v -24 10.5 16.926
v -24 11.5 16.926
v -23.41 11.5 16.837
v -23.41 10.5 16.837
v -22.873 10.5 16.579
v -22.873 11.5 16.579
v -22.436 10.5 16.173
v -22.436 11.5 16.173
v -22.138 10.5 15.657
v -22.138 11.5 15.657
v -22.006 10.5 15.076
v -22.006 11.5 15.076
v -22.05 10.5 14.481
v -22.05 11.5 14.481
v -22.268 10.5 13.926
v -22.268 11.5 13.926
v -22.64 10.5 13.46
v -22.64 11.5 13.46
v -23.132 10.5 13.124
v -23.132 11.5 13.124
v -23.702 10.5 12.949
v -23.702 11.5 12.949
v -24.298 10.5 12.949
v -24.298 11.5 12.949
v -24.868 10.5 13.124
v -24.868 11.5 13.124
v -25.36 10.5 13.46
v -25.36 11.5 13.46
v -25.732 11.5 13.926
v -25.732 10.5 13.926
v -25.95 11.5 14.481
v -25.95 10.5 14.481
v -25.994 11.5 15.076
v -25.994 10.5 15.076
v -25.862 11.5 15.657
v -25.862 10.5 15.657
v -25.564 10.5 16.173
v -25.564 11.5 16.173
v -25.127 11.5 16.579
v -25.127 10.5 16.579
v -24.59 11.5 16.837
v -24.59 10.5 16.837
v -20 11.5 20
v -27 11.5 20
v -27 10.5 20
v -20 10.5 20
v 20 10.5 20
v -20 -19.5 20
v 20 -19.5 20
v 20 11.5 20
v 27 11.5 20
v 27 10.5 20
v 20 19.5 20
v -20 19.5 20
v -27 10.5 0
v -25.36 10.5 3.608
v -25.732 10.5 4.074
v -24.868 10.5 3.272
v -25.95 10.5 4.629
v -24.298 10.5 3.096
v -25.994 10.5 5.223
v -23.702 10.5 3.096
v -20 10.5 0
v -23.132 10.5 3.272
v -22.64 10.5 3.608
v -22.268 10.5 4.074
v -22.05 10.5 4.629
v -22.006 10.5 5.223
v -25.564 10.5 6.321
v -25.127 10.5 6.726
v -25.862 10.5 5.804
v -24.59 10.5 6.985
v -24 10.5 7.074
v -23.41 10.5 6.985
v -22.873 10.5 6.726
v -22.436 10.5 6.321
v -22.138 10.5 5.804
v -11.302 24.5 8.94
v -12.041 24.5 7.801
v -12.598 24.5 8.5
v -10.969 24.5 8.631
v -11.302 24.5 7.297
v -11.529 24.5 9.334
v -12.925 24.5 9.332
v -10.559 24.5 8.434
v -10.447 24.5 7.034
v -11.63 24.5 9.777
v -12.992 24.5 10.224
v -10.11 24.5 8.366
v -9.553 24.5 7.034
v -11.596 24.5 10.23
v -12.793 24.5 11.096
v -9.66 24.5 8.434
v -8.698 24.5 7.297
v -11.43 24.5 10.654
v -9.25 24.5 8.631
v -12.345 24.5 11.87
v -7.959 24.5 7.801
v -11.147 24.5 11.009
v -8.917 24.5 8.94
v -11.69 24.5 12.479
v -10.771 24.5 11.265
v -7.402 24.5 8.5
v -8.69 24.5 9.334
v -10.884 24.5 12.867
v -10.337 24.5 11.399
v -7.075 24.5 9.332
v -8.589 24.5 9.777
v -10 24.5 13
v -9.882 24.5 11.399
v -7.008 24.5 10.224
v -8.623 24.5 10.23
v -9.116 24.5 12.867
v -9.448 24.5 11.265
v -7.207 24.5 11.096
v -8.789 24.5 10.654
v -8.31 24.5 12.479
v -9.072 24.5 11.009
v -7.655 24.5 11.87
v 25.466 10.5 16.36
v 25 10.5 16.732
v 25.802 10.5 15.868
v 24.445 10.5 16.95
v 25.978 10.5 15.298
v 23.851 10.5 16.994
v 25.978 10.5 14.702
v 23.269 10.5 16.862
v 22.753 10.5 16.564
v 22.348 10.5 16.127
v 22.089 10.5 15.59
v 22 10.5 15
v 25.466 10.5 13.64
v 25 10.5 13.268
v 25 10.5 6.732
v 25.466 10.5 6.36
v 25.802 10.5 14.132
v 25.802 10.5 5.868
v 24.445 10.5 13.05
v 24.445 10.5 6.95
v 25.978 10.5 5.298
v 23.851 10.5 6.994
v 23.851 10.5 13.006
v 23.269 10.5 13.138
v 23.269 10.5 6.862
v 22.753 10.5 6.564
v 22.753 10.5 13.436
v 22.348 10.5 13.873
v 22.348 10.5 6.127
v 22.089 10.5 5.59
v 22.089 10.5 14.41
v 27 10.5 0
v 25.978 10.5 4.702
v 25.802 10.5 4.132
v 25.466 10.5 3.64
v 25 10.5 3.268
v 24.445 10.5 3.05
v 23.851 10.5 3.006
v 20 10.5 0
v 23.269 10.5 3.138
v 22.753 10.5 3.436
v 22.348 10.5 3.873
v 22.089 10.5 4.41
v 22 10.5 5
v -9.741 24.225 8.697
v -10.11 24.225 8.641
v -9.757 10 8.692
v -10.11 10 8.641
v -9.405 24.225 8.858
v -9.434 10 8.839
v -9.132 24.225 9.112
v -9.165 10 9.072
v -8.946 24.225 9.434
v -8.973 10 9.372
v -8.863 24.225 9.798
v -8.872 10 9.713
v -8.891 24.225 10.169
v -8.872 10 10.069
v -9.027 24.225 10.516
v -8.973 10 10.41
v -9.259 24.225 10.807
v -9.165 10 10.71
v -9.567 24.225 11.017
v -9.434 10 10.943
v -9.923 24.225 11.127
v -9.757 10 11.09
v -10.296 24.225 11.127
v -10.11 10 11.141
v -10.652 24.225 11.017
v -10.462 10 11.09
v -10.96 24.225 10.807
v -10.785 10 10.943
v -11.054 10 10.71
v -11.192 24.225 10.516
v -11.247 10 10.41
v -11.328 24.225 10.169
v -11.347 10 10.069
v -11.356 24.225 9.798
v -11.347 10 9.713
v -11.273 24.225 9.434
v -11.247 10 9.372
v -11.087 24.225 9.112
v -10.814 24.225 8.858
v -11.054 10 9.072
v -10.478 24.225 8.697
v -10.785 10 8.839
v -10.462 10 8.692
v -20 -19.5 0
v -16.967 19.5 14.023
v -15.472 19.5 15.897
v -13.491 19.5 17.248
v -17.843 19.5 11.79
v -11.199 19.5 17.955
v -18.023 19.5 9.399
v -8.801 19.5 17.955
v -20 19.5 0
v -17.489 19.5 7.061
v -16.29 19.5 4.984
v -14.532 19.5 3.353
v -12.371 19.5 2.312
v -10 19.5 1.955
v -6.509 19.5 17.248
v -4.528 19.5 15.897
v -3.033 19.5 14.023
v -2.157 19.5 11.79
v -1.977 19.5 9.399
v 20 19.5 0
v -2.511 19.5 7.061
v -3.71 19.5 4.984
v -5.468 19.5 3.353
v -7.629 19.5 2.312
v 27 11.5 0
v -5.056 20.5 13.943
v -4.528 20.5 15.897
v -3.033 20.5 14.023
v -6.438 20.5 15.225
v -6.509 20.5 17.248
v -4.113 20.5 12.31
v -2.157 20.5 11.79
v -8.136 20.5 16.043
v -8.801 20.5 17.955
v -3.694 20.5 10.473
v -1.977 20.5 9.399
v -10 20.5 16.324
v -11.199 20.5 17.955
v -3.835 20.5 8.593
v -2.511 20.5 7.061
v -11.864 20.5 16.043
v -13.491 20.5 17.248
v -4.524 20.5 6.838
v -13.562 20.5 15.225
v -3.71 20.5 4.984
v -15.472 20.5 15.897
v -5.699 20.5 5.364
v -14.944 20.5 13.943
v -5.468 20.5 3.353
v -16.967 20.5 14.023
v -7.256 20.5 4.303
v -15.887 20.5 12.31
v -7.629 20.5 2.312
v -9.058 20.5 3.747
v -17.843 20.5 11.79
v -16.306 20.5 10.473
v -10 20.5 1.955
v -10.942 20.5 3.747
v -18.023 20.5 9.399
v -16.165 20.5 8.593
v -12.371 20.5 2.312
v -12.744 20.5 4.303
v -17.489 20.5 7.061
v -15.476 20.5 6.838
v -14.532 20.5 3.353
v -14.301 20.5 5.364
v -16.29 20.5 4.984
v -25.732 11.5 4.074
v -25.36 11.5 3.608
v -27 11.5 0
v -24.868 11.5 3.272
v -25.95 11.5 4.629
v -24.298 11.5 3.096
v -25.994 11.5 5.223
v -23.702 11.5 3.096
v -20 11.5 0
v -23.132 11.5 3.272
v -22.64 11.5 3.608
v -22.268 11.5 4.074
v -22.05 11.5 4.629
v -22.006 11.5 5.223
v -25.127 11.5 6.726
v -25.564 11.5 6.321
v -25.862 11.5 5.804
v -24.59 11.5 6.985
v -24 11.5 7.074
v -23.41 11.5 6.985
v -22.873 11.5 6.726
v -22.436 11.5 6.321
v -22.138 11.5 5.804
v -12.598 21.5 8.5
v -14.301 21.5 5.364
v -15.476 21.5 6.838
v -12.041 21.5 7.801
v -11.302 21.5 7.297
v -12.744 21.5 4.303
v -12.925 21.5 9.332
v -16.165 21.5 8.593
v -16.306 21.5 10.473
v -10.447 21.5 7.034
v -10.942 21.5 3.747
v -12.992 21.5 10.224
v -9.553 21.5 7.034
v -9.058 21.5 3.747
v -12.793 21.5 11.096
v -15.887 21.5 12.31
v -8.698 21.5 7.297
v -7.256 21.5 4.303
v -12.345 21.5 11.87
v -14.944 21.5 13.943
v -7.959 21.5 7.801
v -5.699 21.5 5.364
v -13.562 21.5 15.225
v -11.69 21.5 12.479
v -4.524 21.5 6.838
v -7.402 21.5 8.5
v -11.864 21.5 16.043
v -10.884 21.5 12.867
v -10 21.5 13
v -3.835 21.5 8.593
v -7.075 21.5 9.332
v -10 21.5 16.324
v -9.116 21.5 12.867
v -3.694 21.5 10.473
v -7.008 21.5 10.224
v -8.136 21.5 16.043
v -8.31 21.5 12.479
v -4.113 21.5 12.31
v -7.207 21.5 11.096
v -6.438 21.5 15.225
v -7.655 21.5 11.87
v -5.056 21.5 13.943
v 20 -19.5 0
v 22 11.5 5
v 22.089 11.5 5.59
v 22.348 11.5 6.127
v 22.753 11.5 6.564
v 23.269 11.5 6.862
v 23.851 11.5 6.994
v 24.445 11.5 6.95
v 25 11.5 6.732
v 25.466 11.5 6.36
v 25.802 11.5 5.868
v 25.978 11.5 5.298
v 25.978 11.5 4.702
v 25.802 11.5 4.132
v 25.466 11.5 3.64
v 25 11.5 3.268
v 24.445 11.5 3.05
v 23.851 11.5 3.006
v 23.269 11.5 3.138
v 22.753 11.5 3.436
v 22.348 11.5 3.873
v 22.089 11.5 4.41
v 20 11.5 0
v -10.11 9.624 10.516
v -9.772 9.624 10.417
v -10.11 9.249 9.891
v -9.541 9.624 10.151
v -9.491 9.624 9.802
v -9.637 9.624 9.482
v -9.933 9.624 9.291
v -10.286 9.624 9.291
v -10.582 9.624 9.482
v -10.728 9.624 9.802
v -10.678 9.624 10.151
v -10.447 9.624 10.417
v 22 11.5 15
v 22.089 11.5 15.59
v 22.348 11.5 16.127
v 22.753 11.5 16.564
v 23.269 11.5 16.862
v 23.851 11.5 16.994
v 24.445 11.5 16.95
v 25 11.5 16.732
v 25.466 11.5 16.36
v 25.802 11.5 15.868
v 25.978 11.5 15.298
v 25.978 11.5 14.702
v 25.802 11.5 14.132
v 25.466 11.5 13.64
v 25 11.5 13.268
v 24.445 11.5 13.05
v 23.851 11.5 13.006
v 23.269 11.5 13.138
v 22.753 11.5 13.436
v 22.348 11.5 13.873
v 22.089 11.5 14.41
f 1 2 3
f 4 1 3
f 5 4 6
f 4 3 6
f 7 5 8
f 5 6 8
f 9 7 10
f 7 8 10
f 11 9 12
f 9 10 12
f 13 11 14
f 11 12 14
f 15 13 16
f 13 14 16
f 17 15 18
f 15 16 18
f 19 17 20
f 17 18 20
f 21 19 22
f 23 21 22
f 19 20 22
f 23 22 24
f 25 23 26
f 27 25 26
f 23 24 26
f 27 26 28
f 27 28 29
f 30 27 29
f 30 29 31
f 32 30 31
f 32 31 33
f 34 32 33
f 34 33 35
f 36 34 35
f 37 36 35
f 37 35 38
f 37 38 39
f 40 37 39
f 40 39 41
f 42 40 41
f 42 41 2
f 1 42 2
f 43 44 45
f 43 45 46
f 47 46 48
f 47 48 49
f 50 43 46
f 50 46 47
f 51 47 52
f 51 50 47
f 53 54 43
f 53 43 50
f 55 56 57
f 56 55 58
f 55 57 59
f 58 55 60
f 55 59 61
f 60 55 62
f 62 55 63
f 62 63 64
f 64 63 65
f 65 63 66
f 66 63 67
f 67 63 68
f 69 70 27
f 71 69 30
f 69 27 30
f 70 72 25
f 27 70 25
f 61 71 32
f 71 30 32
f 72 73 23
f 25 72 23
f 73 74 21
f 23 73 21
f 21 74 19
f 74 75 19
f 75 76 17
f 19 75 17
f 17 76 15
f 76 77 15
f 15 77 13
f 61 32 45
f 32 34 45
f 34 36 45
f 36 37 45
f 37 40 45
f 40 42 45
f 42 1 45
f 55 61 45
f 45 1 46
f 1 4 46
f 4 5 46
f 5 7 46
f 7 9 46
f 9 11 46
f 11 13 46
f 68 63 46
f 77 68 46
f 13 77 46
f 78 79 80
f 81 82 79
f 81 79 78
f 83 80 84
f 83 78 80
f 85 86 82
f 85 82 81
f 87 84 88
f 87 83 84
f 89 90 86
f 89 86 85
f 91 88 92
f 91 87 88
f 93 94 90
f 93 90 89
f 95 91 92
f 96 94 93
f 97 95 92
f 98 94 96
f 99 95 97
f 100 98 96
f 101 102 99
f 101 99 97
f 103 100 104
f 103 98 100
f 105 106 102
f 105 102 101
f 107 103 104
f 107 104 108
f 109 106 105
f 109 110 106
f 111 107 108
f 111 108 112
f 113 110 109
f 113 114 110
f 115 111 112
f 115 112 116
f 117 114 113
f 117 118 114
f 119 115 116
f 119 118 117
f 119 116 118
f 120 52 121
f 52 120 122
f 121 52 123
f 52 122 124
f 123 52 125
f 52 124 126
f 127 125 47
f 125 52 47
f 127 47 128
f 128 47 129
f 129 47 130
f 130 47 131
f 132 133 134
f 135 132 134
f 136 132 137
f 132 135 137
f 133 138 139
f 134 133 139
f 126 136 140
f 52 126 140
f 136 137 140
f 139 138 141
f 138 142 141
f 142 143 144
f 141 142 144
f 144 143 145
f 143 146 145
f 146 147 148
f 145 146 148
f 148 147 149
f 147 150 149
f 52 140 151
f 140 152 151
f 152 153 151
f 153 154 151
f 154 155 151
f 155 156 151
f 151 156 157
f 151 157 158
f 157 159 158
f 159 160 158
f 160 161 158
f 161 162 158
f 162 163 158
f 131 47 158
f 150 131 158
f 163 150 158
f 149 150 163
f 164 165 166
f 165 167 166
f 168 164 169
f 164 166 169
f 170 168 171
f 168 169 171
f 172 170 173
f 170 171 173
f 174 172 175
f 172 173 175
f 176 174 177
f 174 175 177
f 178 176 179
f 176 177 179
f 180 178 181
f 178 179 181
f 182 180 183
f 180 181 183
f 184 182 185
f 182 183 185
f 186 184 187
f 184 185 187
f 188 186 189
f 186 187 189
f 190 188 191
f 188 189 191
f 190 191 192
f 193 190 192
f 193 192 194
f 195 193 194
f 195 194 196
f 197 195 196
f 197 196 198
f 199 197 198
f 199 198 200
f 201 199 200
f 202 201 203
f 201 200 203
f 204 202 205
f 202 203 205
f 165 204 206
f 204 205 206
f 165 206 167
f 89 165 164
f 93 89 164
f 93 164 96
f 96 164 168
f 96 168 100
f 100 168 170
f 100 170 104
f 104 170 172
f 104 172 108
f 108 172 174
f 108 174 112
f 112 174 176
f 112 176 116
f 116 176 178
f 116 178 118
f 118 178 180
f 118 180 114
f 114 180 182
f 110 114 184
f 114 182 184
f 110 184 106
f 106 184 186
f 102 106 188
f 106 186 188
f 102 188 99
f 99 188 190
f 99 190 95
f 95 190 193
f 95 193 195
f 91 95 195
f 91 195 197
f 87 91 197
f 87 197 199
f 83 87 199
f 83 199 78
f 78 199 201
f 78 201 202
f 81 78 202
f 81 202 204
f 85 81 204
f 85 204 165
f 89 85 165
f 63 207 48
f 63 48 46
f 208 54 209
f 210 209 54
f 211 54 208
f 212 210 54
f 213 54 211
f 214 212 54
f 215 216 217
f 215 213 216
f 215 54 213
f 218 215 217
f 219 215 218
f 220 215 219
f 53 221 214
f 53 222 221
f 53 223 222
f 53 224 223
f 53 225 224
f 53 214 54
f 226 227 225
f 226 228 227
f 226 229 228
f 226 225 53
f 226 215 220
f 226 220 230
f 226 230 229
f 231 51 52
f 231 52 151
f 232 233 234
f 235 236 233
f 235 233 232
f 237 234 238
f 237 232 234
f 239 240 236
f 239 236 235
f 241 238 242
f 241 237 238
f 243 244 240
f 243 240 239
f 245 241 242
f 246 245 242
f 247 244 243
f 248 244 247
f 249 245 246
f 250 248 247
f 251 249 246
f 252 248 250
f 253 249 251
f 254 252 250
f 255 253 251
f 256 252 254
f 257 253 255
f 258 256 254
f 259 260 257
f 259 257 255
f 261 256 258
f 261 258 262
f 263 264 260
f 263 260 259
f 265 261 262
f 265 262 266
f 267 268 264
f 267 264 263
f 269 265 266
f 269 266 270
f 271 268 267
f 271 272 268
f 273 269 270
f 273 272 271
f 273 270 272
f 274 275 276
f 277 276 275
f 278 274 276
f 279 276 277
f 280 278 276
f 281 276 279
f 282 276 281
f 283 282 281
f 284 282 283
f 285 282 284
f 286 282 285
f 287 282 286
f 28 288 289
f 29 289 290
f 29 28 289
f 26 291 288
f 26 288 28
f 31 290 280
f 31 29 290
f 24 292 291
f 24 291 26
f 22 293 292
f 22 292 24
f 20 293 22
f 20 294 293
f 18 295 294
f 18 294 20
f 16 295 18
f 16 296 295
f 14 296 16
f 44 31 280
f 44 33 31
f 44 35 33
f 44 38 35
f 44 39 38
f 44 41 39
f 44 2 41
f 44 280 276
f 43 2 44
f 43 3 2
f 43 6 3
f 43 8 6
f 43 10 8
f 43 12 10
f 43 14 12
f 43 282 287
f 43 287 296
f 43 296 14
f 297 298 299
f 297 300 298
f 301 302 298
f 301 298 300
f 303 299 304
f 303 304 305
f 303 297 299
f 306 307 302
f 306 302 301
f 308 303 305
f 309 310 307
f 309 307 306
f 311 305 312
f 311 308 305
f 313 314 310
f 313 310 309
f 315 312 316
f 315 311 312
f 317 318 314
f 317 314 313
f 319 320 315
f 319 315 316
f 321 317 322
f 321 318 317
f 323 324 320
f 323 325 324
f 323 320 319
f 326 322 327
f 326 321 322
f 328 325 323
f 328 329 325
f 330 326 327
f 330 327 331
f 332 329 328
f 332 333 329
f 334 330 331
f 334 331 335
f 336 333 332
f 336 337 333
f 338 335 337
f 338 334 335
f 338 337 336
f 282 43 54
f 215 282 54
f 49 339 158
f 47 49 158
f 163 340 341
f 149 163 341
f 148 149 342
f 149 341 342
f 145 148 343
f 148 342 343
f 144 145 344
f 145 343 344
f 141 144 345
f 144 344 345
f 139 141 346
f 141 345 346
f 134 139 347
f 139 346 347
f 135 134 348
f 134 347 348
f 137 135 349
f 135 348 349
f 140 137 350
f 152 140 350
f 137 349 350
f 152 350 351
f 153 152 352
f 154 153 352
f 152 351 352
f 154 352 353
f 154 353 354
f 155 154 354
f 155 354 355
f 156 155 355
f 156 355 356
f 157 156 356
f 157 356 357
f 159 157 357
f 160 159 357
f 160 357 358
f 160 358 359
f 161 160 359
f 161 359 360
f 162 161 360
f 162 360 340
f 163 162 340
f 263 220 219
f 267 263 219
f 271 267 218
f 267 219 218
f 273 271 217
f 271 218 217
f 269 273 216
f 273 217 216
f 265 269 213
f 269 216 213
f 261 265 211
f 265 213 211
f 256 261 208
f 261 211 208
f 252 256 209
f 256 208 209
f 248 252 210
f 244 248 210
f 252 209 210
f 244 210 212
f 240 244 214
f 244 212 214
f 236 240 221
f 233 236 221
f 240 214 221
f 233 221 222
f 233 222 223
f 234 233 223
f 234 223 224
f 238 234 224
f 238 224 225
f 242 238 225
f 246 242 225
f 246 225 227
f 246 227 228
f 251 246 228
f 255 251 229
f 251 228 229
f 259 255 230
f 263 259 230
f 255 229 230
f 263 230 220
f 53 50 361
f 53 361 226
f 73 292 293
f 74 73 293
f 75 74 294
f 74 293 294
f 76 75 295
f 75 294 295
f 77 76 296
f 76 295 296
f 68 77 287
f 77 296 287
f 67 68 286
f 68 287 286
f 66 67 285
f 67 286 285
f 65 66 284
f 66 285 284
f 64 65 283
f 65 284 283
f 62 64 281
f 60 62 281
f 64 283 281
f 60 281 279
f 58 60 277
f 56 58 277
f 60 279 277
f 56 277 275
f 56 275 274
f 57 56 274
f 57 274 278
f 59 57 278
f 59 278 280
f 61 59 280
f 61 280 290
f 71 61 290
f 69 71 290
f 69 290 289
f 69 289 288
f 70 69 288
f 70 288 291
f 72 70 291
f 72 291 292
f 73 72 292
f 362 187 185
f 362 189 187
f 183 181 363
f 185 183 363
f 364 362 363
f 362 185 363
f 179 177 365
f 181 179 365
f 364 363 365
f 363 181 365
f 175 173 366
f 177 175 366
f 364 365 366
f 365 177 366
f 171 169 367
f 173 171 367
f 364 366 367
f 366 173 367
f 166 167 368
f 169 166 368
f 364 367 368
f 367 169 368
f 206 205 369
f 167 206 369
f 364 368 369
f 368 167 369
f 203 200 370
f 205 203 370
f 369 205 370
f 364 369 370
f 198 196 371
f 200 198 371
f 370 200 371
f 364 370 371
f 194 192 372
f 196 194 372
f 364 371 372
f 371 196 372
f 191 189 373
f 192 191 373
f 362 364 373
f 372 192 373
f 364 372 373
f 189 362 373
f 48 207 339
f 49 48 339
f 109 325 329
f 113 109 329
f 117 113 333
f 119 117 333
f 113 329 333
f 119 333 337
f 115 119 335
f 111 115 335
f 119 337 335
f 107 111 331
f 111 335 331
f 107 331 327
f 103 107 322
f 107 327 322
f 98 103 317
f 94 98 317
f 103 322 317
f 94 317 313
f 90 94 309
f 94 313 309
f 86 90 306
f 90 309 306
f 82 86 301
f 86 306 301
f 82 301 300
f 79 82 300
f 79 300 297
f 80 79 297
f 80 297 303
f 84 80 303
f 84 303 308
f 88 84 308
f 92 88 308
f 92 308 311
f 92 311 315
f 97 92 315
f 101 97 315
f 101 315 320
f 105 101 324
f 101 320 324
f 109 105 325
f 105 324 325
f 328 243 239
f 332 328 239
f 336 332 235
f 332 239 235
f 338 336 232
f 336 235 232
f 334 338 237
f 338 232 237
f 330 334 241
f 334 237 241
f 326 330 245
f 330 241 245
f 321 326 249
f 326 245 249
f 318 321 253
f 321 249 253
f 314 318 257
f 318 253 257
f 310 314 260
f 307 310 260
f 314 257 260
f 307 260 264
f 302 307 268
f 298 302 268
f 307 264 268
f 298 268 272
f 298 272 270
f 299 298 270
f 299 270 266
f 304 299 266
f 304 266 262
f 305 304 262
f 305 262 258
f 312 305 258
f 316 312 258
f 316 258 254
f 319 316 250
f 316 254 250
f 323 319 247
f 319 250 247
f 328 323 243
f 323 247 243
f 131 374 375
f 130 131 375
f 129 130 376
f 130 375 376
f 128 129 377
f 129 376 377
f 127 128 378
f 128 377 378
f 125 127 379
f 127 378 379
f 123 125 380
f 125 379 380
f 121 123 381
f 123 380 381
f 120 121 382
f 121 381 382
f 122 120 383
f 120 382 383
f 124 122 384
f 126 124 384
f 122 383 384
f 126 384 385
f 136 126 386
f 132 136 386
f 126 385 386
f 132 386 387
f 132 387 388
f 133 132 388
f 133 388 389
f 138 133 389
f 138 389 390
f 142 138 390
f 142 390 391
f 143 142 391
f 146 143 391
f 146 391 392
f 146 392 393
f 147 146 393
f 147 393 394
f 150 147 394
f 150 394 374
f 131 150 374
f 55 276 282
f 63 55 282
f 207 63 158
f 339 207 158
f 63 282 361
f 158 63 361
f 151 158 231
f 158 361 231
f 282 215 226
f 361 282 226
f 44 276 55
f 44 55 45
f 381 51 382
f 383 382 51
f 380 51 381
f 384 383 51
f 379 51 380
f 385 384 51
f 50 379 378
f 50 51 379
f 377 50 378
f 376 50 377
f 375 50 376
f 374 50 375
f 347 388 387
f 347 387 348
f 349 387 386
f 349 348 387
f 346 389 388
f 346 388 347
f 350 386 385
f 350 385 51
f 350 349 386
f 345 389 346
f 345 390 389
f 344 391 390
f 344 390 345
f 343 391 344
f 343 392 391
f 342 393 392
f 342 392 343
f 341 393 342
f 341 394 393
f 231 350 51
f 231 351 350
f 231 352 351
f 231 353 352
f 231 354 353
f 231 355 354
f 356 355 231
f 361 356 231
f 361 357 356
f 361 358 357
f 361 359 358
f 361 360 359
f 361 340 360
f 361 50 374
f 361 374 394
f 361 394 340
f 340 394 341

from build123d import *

# Parameters (mm, degrees)
SKETCH_1_W                   = 40
SKETCH_1_H                   = 39
EXTRUDE_1_DEPTH              = 20
SKETCH_2_W                   = 20
SKETCH_2_H                   = 1
EXTRUDE_2_DEPTH              = 7
SKETCH_3_W                   = 20
SKETCH_3_H                   = 1
EXTRUDE_3_DEPTH              = 7
SKETCH_5_R                   = 2
CUT_EXTRUDE_1_DEPTH          = 46.716517803
SKETCH_6_R                   = 2
CUT_EXTRUDE_2_DEPTH          = 46.716517803
SKETCH_7_R                   = 8.045118309
EXTRUDE_4_DEPTH              = 1
SKETCH_8_R                   = 6.323674856
EXTRUDE_5_DEPTH              = 1
SKETCH_9_R                   = 3
EXTRUDE_6_DEPTH              = 3
HOLE_WIZARD_M3_1_D           = 2.5
HOLE_WIZARD_M3_1_DEPTH       = 14.5
HOLE_WIZARD_M3_1_CSINK_D     = 3.05
HOLE_WIZARD_M3_1_CSINK_ANGLE = 90
HOLE_WIZARD_M3_1_TIP         = 0.751075774


with BuildPart() as part:
    # 草图1 → 凸台-拉伸1 (new body)
    with BuildSketch(Plane.XY):
        Rectangle(SKETCH_1_W, SKETCH_1_H)
    extrude(amount=EXTRUDE_1_DEPTH)

    # 草图2 → 凸台-拉伸2 (add)
    with BuildSketch(Plane.ZY.offset(20)):
        with Locations((10, 11)):
            Rectangle(SKETCH_2_W, SKETCH_2_H)
    extrude(amount=EXTRUDE_2_DEPTH)

    # 草图3 → 凸台-拉伸3 (add)
    with BuildSketch(Plane(origin=(20, 0, 0), x_dir=(0, 0, -1), z_dir=(1, 0, 0))):
        with Locations((-10, 11)):
            Rectangle(SKETCH_3_W, SKETCH_3_H)
    extrude(amount=EXTRUDE_3_DEPTH)

    # 草图5 → 切除-拉伸1 (cut, through all)
    with BuildSketch(Plane(origin=(0, 11.5, 0), x_dir=(1, 0, 0), z_dir=(0, 1, 0))):
        with Locations(Location((-24, -5.073781131, 0), (0, 0, 270))):
            Circle(SKETCH_5_R)
        with Locations(Location((-24, -14.926218869, 0), (0, 0, 270))):
            Circle(SKETCH_5_R)
    extrude(amount=-CUT_EXTRUDE_1_DEPTH, mode=Mode.SUBTRACT)

    # 草图6 → 切除-拉伸2 (cut, through all)
    with BuildSketch(Plane(origin=(0, 11.5, 0), x_dir=(1, 0, 0), z_dir=(0, 1, 0))):
        with Locations(Location((24, -5, 0), (0, 0, 180))):
            Circle(SKETCH_6_R)
        with Locations(Location((24, -15, 0), (0, 0, 180))):
            Circle(SKETCH_6_R)
    extrude(amount=-CUT_EXTRUDE_2_DEPTH, mode=Mode.SUBTRACT)

    # 草图7 → 凸台-拉伸4 (add)
    with BuildSketch(Plane(origin=(0, 19.5, 0), x_dir=(1, 0, 0), z_dir=(0, 1, 0))):
        with Locations(Location((-10, -10, 0), (0, 0, 90))):
            Circle(SKETCH_7_R)
    extrude(amount=EXTRUDE_4_DEPTH)

    # 草图8 → 凸台-拉伸5 (add)
    with BuildSketch(Plane(origin=(0, 20.5, 0), x_dir=(1, 0, 0), z_dir=(0, 1, 0))):
        with Locations(Location((-10, -10, 0), (0, 0, 270))):
            Circle(SKETCH_8_R)
    extrude(amount=EXTRUDE_5_DEPTH)

    # 草图9 → 凸台-拉伸6 (add)
    with BuildSketch(Plane(origin=(0, 21.5, 0), x_dir=(1, 0, 0), z_dir=(0, 1, 0))):
        with Locations(Location((-10, -10, 0), (0, 0, 270))):
            Circle(SKETCH_9_R)
    extrude(amount=EXTRUDE_6_DEPTH)

    # M3 螺纹孔1
    with Locations(Plane(origin=(-10.109547736, 24.5, 9.891000731), x_dir=(0, 0, 1), z_dir=(0, 1, 0))):
        with Locations((0, 0)):
            CounterSinkHole(HOLE_WIZARD_M3_1_D / 2, HOLE_WIZARD_M3_1_CSINK_D / 2, depth=HOLE_WIZARD_M3_1_DEPTH, counter_sink_angle=HOLE_WIZARD_M3_1_CSINK_ANGLE)
            with Locations((0, 0, -(HOLE_WIZARD_M3_1_DEPTH + HOLE_WIZARD_M3_1_TIP / 2))):  # 118° drill point
                Cone(0, HOLE_WIZARD_M3_1_D / 2, HOLE_WIZARD_M3_1_TIP, mode=Mode.SUBTRACT)


solid = part.part
